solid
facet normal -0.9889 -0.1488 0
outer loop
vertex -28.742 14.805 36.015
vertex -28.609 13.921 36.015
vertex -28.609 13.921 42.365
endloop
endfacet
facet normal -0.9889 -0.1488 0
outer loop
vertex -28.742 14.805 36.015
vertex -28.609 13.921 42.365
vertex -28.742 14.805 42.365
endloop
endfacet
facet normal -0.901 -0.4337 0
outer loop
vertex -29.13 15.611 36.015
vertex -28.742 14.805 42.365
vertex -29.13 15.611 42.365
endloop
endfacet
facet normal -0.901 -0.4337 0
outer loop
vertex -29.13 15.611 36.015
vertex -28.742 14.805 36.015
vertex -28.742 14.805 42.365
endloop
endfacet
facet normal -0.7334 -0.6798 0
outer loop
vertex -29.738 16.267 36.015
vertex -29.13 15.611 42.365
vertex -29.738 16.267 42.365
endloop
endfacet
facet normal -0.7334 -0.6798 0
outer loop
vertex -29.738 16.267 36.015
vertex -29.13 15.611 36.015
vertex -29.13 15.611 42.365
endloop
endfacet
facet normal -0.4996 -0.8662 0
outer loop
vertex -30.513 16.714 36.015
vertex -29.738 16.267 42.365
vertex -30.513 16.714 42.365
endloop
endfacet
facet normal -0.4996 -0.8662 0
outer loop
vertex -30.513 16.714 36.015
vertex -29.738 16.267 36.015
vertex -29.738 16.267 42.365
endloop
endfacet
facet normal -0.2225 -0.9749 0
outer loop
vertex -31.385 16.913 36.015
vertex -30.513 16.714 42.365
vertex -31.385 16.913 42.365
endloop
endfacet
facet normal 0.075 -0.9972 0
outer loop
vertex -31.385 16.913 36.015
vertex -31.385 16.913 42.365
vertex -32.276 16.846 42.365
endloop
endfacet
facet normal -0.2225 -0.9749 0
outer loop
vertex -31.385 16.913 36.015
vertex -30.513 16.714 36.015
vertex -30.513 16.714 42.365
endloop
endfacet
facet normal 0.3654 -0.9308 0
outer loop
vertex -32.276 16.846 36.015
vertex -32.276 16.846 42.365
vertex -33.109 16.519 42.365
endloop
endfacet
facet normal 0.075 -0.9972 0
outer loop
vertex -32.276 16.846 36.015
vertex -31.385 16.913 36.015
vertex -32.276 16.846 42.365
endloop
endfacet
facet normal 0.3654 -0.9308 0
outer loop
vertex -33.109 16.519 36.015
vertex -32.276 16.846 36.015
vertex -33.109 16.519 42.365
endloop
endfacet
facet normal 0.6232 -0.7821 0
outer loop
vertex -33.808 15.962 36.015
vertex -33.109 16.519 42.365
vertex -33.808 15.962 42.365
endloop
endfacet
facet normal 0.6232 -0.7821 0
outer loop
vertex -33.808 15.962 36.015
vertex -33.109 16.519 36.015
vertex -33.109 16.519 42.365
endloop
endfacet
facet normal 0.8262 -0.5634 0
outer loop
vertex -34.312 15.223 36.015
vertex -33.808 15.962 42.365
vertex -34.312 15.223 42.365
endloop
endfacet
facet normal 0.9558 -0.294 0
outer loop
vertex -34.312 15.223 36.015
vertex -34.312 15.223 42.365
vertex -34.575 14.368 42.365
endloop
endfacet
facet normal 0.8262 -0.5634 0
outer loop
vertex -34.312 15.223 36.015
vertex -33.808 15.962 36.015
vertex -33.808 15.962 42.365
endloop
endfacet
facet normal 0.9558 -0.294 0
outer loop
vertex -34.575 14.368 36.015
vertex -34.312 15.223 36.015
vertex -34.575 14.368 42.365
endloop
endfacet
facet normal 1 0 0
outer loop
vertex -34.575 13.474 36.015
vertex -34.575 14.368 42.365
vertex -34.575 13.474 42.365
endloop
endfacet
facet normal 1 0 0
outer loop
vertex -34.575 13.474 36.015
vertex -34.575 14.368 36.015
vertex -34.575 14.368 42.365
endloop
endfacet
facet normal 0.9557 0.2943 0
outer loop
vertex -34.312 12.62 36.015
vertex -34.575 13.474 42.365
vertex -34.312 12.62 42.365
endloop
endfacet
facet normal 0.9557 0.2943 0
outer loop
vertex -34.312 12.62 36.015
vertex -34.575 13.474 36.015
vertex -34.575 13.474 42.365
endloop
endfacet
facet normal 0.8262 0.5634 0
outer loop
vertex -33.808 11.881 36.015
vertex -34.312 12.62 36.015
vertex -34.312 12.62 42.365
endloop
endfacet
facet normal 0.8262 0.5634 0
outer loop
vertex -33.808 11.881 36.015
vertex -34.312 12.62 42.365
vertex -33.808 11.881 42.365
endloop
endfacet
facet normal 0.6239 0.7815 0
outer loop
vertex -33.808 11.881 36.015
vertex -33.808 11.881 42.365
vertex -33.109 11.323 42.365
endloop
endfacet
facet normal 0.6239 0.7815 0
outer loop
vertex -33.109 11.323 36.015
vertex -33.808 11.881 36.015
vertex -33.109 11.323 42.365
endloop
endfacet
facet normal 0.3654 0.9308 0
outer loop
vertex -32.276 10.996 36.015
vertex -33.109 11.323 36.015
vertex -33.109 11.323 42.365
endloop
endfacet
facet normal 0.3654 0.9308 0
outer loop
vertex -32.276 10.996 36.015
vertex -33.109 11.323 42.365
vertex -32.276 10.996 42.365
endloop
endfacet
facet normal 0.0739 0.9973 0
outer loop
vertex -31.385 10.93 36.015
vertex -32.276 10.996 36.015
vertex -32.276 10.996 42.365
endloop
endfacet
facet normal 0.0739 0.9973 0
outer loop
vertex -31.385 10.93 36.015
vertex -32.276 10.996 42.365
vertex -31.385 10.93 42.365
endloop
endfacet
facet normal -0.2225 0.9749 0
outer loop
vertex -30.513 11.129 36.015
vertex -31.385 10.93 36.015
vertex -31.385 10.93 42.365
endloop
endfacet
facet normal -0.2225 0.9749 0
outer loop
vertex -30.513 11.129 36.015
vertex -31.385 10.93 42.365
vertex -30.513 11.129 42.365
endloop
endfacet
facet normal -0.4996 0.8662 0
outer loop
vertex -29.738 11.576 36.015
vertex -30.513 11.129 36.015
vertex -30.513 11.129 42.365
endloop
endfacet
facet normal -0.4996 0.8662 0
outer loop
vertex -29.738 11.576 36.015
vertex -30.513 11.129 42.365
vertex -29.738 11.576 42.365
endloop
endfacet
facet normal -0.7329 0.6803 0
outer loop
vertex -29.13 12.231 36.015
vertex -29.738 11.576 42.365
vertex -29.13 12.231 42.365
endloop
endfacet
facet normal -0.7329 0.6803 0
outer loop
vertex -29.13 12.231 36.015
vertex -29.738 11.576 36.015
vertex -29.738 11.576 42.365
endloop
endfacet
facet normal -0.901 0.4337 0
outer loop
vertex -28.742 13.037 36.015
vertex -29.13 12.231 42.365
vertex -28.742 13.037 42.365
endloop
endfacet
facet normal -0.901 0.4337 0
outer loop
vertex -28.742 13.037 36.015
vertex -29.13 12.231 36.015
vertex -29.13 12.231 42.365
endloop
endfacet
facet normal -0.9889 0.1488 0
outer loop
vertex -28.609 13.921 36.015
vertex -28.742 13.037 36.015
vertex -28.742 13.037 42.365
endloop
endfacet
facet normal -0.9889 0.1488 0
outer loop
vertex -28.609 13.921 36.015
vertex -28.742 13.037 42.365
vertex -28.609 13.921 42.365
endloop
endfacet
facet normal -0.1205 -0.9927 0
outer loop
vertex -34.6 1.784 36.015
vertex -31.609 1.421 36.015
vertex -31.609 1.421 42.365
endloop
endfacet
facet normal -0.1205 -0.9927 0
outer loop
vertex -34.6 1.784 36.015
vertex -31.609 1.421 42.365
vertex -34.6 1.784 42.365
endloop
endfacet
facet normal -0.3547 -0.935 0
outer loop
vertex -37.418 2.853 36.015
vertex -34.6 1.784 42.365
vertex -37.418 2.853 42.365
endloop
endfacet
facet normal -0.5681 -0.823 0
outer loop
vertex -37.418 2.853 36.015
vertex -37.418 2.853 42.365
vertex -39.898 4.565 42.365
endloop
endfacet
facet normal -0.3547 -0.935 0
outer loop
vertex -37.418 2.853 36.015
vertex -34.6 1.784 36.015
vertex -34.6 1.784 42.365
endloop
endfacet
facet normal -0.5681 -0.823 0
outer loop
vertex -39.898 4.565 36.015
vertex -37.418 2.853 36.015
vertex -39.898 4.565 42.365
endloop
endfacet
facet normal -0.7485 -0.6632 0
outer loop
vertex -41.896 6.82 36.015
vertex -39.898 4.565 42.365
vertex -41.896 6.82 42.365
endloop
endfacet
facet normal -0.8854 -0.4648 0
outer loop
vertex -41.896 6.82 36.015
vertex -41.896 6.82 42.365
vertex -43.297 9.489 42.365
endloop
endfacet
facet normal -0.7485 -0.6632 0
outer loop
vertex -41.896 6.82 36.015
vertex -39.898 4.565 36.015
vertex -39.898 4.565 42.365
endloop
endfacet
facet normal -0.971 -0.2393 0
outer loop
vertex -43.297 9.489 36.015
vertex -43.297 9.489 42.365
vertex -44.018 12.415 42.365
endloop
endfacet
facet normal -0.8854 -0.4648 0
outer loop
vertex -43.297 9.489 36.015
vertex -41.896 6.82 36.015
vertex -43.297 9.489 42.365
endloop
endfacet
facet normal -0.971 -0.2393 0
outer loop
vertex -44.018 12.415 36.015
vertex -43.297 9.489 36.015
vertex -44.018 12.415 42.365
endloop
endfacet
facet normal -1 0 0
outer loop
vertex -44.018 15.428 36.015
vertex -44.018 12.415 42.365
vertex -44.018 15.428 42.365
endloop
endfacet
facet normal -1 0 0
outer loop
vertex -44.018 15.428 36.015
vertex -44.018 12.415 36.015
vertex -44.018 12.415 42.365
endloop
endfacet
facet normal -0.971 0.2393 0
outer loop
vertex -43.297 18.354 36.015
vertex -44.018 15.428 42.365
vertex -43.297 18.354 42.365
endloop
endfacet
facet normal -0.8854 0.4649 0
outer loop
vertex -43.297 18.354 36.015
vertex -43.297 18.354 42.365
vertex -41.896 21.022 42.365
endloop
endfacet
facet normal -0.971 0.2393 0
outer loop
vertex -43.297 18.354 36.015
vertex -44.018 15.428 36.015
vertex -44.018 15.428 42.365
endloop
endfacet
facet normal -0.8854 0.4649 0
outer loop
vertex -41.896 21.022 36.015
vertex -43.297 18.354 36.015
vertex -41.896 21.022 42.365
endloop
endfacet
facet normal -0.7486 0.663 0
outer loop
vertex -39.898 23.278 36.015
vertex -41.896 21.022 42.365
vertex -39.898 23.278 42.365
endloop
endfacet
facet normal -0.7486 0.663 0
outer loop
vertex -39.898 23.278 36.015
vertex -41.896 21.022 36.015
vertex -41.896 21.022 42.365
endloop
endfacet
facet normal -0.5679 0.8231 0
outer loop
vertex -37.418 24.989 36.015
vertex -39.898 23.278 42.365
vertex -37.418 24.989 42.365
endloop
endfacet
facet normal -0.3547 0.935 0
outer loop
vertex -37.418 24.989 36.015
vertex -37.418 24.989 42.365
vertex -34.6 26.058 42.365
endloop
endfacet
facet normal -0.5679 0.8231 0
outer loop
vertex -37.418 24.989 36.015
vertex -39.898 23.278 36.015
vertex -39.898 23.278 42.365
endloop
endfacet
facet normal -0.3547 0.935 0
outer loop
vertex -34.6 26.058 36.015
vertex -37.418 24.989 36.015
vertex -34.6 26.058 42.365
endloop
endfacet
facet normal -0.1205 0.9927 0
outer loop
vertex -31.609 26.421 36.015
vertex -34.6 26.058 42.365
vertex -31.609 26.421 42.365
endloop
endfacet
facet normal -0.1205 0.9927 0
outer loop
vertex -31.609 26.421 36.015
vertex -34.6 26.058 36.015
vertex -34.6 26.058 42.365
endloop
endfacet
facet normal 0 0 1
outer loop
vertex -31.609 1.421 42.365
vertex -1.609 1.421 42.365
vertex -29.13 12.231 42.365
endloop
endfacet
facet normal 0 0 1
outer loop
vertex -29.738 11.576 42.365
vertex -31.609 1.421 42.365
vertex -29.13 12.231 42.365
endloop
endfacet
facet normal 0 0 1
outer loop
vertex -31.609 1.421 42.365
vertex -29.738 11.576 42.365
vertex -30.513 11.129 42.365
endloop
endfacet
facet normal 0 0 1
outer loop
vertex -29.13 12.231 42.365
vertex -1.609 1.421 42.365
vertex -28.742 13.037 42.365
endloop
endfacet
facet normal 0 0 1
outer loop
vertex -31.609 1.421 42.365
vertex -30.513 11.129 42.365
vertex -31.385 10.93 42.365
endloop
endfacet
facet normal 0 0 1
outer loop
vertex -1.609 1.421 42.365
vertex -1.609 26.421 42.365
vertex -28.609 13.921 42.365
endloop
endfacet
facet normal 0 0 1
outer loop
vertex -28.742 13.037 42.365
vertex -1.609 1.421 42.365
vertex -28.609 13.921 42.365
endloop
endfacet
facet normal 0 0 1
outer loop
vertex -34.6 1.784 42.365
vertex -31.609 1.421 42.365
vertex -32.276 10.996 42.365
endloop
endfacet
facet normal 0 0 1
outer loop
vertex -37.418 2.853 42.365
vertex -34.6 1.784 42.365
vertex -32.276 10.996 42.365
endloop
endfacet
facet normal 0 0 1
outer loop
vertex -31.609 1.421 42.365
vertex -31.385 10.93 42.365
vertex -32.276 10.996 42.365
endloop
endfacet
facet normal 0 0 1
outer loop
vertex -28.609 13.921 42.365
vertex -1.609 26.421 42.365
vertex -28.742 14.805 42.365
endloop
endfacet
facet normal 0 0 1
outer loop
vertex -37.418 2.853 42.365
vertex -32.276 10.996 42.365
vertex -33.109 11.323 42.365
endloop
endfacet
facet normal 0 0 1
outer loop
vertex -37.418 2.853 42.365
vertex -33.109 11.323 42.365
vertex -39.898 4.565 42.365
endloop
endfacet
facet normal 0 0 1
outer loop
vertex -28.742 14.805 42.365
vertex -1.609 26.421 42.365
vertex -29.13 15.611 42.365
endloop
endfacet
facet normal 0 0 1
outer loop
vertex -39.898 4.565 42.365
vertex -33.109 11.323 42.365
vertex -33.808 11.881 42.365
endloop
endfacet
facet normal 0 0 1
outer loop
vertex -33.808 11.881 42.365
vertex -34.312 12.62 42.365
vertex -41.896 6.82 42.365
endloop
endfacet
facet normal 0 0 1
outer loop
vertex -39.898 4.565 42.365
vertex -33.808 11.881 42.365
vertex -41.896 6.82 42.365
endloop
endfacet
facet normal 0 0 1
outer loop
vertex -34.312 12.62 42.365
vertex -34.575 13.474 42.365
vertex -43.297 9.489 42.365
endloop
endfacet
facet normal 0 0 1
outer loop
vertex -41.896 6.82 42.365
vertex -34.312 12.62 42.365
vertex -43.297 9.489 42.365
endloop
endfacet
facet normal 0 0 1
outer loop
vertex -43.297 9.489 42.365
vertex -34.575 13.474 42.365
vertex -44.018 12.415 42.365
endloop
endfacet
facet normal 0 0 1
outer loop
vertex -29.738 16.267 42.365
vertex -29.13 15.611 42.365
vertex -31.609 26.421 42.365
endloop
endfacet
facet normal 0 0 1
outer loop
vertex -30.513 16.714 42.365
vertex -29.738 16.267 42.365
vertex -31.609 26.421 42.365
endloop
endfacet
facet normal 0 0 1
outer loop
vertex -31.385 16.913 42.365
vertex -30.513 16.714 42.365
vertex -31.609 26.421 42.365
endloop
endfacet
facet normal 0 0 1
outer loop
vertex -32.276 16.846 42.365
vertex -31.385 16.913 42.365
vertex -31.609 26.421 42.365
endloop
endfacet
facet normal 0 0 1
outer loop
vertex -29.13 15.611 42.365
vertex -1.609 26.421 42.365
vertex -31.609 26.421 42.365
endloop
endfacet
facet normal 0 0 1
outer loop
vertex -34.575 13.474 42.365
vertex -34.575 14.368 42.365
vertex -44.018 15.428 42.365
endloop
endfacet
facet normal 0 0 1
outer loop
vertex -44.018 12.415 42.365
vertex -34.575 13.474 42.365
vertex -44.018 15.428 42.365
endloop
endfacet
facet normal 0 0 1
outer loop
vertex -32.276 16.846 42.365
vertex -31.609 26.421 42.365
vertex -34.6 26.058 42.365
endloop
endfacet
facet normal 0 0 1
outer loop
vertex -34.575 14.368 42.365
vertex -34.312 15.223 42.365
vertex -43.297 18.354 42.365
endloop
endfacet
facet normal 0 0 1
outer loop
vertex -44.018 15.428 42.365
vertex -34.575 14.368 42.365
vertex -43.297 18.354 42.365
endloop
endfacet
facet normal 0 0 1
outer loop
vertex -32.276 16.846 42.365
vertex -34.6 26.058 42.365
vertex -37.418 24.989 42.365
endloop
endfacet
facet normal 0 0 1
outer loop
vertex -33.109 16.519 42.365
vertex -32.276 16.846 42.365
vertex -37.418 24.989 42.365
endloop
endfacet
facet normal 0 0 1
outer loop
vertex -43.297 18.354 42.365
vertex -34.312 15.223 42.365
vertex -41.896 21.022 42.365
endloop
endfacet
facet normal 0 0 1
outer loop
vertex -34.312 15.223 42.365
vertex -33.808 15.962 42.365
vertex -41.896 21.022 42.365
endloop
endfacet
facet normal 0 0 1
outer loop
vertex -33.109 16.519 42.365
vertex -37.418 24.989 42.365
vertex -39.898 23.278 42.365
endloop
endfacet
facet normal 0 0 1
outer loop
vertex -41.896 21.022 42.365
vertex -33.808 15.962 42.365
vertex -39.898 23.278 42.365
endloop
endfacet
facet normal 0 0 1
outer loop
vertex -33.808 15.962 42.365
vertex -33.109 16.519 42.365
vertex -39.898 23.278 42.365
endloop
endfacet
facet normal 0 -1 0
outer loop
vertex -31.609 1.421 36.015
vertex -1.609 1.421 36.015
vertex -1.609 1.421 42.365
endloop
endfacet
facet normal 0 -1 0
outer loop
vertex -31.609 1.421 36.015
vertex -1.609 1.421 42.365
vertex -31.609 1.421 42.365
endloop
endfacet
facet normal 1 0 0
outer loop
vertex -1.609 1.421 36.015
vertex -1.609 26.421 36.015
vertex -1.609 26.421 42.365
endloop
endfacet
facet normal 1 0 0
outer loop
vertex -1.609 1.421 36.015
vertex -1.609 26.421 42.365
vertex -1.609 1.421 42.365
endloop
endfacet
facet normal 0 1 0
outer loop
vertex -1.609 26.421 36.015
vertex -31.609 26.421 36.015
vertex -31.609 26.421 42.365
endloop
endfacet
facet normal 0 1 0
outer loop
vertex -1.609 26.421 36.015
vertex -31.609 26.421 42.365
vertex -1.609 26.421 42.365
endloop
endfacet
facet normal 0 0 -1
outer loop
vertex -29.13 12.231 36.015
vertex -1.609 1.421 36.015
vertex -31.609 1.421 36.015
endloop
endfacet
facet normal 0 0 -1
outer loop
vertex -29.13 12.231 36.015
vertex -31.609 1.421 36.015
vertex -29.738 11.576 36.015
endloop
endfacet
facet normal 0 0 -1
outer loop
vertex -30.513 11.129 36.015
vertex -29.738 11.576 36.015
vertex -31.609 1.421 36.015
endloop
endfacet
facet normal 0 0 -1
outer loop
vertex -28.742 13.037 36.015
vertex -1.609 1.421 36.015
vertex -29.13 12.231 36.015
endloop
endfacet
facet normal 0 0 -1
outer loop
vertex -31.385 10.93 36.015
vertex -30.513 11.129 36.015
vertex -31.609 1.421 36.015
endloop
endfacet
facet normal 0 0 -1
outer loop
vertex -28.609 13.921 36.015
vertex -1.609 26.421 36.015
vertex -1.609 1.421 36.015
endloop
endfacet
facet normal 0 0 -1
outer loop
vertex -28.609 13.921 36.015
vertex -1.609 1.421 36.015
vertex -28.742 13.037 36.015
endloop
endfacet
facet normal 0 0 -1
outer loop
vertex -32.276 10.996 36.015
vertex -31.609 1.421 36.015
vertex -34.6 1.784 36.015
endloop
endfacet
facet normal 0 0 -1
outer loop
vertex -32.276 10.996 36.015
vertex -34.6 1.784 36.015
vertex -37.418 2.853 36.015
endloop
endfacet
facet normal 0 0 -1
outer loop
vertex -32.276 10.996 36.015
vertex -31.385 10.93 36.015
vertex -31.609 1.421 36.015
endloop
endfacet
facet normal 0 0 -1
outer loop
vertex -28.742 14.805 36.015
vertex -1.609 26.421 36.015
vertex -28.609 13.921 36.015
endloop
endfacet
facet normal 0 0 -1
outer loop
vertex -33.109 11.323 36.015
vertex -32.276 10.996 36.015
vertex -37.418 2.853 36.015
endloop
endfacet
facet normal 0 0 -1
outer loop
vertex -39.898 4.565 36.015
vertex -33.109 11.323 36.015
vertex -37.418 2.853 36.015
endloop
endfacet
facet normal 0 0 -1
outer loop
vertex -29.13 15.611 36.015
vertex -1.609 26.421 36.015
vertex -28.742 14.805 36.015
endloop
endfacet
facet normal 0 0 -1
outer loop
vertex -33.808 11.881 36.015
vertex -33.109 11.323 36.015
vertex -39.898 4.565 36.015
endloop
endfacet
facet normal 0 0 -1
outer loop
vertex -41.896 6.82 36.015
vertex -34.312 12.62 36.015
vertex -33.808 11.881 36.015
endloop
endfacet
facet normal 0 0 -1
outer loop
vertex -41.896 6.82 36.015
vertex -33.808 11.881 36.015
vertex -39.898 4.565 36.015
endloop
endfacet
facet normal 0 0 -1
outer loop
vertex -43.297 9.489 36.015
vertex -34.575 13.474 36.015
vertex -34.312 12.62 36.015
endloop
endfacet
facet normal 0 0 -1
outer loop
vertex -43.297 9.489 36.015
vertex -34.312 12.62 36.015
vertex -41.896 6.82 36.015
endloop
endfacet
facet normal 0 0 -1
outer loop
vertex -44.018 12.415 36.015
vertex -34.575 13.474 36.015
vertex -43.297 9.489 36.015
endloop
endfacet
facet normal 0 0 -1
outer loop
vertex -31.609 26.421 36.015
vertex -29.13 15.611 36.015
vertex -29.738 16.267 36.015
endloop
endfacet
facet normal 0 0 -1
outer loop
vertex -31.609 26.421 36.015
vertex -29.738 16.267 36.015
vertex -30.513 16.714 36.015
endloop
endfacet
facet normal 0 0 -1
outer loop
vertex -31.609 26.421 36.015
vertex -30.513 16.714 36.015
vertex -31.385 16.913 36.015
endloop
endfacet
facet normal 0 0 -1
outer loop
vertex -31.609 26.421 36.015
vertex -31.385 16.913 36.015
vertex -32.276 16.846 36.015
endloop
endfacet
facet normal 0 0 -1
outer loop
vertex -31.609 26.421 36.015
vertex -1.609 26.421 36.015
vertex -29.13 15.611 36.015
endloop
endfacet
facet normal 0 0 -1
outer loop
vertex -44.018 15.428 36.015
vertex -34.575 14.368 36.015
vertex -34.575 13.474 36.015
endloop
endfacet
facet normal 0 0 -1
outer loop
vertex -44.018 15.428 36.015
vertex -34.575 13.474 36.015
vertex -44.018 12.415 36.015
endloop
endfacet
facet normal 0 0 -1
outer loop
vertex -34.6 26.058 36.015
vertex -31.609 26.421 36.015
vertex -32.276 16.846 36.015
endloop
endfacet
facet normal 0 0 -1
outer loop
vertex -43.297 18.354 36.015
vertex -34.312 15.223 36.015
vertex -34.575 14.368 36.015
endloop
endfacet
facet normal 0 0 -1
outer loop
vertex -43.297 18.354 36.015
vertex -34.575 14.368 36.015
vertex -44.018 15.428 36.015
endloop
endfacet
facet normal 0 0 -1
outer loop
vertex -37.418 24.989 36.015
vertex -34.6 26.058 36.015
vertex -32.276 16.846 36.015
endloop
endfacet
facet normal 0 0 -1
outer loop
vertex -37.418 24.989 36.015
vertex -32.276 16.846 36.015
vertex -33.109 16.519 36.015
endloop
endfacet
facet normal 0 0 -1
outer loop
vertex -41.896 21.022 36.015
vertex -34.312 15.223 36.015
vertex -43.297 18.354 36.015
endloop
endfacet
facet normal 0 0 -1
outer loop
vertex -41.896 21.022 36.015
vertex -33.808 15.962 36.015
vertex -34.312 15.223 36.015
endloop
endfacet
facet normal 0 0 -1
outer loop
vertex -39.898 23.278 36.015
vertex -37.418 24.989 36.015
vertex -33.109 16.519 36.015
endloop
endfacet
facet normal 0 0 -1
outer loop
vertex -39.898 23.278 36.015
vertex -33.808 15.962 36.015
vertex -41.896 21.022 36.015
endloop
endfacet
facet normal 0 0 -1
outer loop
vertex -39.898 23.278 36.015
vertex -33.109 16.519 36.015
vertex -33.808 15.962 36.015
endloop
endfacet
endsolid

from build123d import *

# Parameters (mm, degrees)
SKETCH1_R           = 3
BOSS_EXTRUDE1_DEPTH = 6.35


with BuildPart() as part:
    # Sketch1 → Boss-Extrude1 (new body)
    with BuildSketch(Plane.XY.offset(36.015266699)):
        with BuildLine():
            Line((-1.608835655, 1.421229345), (-31.608835655, 1.421229345))
            ThreePointArc((-31.608835655, 1.421229345), (-44.108835655, 13.921229345), (-31.608835655, 26.421229345))
            Line((-31.608835655, 26.421229345), (-1.608835655, 26.421229345))
            Line((-1.608835655, 26.421229345), (-1.608835655, 1.421229345))
        make_face()
        with Locations((-31.608835655, 13.921229345)):
            Circle(SKETCH1_R, mode=Mode.SUBTRACT)
    extrude(amount=BOSS_EXTRUDE1_DEPTH)


solid = part.part
